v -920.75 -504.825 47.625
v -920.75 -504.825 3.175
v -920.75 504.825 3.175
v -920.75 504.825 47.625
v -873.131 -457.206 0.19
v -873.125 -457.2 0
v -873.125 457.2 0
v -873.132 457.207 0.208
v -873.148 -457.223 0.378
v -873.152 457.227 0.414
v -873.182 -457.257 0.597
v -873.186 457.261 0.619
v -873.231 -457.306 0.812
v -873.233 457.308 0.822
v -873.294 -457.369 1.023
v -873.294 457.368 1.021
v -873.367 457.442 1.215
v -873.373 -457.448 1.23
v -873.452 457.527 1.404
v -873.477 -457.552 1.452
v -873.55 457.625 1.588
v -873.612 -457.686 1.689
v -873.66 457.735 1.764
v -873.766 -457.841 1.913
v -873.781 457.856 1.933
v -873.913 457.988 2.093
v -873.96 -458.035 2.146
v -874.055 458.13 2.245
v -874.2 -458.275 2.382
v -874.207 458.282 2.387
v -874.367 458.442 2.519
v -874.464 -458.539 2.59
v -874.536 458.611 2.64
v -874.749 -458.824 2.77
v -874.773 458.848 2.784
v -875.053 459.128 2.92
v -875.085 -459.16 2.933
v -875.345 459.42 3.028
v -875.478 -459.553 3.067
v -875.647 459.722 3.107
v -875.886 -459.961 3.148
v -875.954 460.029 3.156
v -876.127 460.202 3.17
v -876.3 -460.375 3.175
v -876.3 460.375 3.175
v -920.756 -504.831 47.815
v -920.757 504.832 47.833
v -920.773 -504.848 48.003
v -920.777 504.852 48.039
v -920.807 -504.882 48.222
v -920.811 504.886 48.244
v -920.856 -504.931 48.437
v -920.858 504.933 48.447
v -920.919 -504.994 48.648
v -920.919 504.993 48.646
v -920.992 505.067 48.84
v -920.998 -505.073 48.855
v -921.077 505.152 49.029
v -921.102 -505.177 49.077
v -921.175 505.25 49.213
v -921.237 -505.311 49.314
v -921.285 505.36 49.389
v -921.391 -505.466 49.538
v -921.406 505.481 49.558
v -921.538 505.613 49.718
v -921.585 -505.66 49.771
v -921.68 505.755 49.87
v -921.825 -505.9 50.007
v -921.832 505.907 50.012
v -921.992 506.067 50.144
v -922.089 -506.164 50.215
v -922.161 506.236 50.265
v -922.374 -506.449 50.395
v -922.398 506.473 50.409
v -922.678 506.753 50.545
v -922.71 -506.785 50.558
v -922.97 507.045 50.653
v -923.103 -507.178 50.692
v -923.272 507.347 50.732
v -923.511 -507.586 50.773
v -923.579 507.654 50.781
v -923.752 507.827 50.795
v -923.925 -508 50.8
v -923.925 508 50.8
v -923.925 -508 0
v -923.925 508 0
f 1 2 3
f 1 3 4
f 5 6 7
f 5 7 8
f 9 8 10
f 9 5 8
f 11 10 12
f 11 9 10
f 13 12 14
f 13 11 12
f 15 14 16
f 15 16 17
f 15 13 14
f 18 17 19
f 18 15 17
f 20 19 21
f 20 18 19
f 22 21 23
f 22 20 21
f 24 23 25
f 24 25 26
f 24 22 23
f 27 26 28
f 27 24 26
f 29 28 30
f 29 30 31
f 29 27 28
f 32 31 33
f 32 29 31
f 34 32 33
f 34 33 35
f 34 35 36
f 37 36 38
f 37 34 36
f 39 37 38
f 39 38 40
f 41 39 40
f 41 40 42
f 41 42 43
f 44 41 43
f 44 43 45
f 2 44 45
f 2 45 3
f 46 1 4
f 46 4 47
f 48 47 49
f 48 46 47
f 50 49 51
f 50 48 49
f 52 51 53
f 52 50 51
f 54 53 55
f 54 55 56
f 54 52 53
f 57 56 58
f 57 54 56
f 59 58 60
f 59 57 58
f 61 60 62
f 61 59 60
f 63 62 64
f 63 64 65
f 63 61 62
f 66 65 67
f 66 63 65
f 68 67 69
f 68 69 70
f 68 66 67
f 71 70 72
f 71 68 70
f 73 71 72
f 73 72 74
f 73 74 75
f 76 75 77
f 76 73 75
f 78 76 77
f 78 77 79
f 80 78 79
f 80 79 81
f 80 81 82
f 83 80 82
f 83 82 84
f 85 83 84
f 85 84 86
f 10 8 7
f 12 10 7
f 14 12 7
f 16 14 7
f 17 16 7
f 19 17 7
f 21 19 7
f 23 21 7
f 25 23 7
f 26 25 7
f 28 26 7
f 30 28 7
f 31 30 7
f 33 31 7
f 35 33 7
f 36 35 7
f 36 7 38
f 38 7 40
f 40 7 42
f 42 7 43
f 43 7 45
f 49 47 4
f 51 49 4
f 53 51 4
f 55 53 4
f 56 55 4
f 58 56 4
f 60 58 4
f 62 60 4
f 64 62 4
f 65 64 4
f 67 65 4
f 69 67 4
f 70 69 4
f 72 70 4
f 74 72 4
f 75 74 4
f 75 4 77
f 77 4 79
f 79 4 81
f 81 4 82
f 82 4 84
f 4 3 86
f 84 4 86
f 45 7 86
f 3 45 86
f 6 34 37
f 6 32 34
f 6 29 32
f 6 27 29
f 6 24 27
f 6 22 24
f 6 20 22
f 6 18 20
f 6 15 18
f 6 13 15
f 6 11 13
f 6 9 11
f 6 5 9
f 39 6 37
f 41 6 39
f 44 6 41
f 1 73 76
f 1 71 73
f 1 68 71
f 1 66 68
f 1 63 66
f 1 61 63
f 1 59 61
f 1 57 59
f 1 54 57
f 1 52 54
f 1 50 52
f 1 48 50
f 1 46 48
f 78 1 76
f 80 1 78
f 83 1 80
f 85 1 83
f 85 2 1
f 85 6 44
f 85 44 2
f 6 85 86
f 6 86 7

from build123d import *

# Parameters (mm, degrees)
F1_DEPTH = 508
F3_DEPTH = 50.8


# Not quite as in the source:
# - a pattern or mirror of a feature is missing from the dataset's text; its kind, count and spacing are read off the source's solid


with BuildPart() as f1:
    # F0 (on Front) → F1 (new body, symmetric)
    with BuildSketch(Plane.XZ):
        with BuildLine():
            ThreePointArc((-920.7500404358, 47.625), (-921.6799764055, 49.8700640303), (-923.9250404358, 50.8))
            Line((-923.9250404358, 50.8), (-923.9250404358, 0))
            Line((-923.9250404358, 0), (-873.1250404358, 0))
            ThreePointArc((-873.1250404358, 0), (-874.0549764055, 2.2450640303), (-876.3000404358, 3.175))
            Line((-876.3000404358, 3.175), (-920.7500404358, 3.175))
            Line((-920.7500404358, 3.175), (-920.7500404358, 47.625))
        make_face()
    extrude(amount=F1_DEPTH, both=True)

    # F2 (on face) → F3 (cut)
    with BuildSketch(Plane(origin=(0, 0, 0), x_dir=(1, 0, 0), z_dir=(0, 0, -1))):
        Polygon((-873.1250404358, -457.2), (-923.9250404358, -508), (-873.1250404358, -508), align=None)
    f3 = extrude(amount=-F3_DEPTH, mode=Mode.SUBTRACT)

    # F3_copies: F3 across plane
    add(f3.mirror(Plane(origin=(0, 0, 0), x_dir=(0, 0, -1), z_dir=(0, -1, 0))), mode=Mode.SUBTRACT)


solid = f1.part
